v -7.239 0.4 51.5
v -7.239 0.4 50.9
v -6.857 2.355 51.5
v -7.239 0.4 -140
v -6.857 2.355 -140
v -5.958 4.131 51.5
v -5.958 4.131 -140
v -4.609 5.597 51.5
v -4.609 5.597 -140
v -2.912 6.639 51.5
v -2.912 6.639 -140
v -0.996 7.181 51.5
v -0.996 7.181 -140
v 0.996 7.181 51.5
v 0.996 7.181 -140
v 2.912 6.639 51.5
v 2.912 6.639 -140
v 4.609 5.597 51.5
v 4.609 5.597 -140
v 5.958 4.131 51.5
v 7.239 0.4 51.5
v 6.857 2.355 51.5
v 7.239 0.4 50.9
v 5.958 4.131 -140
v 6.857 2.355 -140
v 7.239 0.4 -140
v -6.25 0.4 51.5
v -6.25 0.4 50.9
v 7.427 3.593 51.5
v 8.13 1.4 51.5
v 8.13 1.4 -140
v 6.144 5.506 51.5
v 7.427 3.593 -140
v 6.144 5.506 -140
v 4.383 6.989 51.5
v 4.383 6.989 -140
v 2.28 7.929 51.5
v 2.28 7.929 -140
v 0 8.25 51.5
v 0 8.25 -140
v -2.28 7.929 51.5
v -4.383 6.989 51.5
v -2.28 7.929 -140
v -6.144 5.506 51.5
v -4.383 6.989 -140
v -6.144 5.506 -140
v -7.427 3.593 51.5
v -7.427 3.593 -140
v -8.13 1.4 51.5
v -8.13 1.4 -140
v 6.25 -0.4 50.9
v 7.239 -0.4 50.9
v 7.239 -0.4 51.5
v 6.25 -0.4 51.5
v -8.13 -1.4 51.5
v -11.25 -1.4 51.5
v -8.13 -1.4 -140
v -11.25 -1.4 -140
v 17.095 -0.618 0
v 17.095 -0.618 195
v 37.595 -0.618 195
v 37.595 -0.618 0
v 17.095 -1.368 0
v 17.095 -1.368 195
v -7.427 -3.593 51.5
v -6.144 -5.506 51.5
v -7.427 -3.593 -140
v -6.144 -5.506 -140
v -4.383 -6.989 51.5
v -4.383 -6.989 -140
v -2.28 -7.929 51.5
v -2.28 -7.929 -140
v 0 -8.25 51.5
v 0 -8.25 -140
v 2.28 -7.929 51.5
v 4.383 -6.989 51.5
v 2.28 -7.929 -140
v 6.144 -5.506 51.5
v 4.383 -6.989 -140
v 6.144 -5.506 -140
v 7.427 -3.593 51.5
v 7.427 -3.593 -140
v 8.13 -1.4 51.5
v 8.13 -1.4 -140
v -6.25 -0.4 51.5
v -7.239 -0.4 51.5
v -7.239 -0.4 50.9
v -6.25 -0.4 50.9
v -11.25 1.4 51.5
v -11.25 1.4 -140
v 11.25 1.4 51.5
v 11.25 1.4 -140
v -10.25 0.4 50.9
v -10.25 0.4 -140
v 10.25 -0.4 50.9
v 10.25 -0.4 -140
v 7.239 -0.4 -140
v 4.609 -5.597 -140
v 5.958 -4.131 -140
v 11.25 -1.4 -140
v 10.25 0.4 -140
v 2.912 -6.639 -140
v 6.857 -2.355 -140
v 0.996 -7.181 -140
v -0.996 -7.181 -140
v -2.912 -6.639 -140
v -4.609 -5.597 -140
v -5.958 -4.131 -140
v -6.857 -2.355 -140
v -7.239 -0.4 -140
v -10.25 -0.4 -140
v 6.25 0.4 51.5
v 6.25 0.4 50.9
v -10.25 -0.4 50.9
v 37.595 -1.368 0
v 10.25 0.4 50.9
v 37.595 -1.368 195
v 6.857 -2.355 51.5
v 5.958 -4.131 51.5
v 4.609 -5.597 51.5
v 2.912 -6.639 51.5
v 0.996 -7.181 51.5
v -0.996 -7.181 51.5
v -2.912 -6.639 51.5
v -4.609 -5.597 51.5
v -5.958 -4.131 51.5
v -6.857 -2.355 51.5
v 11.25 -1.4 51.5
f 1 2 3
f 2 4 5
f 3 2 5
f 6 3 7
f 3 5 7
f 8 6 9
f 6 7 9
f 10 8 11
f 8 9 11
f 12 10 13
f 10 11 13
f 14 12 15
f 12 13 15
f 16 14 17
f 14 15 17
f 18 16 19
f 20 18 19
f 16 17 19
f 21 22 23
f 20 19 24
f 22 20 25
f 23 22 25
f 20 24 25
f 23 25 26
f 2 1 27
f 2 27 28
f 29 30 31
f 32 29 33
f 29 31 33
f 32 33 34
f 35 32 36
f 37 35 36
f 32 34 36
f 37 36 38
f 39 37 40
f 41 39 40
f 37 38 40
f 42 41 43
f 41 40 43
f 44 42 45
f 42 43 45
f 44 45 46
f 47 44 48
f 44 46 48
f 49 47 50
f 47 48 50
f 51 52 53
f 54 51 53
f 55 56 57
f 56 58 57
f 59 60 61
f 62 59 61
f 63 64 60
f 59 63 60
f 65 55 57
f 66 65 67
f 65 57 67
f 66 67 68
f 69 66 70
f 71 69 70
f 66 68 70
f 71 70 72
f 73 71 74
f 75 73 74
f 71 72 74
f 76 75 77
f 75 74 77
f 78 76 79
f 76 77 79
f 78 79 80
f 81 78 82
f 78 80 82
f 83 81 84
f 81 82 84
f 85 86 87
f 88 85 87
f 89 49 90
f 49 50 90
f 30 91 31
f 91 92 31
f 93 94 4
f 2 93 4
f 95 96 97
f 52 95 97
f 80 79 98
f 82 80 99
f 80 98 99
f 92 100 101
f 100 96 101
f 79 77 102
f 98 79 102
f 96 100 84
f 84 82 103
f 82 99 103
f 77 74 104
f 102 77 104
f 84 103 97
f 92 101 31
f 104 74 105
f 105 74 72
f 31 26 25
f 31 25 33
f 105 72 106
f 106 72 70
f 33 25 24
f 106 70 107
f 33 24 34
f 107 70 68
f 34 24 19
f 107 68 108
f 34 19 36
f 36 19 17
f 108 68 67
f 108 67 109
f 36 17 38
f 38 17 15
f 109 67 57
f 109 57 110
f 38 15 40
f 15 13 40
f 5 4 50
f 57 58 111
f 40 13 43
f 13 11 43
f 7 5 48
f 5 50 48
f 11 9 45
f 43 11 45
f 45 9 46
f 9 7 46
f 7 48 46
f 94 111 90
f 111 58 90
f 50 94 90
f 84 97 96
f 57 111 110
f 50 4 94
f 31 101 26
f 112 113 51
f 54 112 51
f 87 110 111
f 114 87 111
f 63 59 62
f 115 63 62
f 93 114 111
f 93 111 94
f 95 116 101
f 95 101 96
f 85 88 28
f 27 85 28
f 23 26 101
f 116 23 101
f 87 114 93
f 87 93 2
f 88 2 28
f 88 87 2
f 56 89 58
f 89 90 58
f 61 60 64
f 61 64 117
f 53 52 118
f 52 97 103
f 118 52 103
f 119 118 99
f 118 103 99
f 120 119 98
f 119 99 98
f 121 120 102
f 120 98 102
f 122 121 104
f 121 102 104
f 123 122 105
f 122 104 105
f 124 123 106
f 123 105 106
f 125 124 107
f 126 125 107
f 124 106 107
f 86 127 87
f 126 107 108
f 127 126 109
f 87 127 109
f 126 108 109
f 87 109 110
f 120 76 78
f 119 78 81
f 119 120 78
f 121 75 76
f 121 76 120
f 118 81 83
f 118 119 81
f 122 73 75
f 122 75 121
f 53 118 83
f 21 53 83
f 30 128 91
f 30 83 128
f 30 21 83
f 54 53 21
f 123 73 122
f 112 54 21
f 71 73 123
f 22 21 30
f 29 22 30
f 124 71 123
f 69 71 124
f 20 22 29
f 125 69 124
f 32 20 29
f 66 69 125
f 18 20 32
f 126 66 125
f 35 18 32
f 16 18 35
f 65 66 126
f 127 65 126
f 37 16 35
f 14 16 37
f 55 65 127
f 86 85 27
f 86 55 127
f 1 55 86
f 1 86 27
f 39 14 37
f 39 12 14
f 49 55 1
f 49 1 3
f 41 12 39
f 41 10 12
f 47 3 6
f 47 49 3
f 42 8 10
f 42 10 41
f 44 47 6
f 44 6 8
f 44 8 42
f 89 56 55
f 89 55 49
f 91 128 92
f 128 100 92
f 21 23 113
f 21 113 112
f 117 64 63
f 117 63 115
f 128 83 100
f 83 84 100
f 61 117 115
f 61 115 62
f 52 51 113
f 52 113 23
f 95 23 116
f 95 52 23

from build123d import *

# Parameters (mm, degrees)
F1_DEPTH  = 50.5
F2_W      = 20.5
F2_H      = 0.75
F3_DEPTH  = 195
F4_DEPTH  = 140
F5_DEPTH  = 1
F6_DEPTH  = 4
F7_DEPTH  = 4
F9_DEPTH  = 190.9
F11_DEPTH = 190.9


with BuildPart() as f1:
    # F0 (on Top) → F1 (new body)
    with BuildSketch(Plane.XY):
        with BuildLine():
            Line((-10.25, 0.4), (-8.2402973247, 0.4))
            ThreePointArc((-8.2402973247, 0.4), (-8.2005778814, 0.9016775541), (-8.1303443961, 1.4))
            Line((-8.1303443961, 1.4), (-11.25, 1.4))
            Line((-11.25, 1.4), (-11.25, -1.4))
            Line((-11.25, -1.4), (-8.1303443961, -1.4))
            ThreePointArc((-8.1303443961, -1.4), (-8.2005778814, -0.9016775541), (-8.2402973247, -0.4))
            Line((-8.2402973247, -0.4), (-10.25, -0.4))
            Line((-10.25, -0.4), (-10.25, 0.4))
        make_face()
        with BuildLine():
            ThreePointArc((-7.2389571072, 0.4), (0, 7.25), (7.2389571072, 0.4))
            Line((7.2389571072, 0.4), (8.2402973247, 0.4))
            ThreePointArc((8.2402973247, 0.4), (8.2005778814, 0.9016775541), (8.1303443961, 1.4))
            ThreePointArc((8.1303443961, 1.4), (0, 8.25), (-8.1303443961, 1.4))
            ThreePointArc((-8.1303443961, 1.4), (-8.2005778814, 0.9016775541), (-8.2402973247, 0.4))
            Line((-8.2402973247, 0.4), (-7.2389571072, 0.4))
        make_face()
        with BuildLine():
            Line((8.2402973247, -0.4), (7.2389571072, -0.4))
            ThreePointArc((7.2389571072, -0.4), (0, -7.25), (-7.2389571072, -0.4))
            Line((-7.2389571072, -0.4), (-8.2402973247, -0.4))
            ThreePointArc((-8.2402973247, -0.4), (-8.2005778814, -0.9016775541), (-8.1303443961, -1.4))
            ThreePointArc((-8.1303443961, -1.4), (0, -8.25), (8.1303443961, -1.4))
            ThreePointArc((8.1303443961, -1.4), (8.2005778814, -0.9016775541), (8.2402973247, -0.4))
        make_face()
        with BuildLine():
            ThreePointArc((8.1303443961, 1.4), (8.2005778814, 0.9016775541), (8.2402973247, 0.4))
            Line((8.2402973247, 0.4), (10.25, 0.4))
            Line((10.25, 0.4), (10.25, -0.4))
            Line((10.25, -0.4), (8.2402973247, -0.4))
            ThreePointArc((8.2402973247, -0.4), (8.2005778814, -0.9016775541), (8.1303443961, -1.4))
            Line((8.1303443961, -1.4), (11.25, -1.4))
            Line((11.25, -1.4), (11.25, 1.4))
            Line((11.25, 1.4), (8.1303443961, 1.4))
        make_face()
    extrude(amount=F1_DEPTH)

    # F4 (add): a face of the model
    f4_faces = [f1.faces().sort_by_distance(p)[0] for p in [
        (-10.5290161286, 0, 0),
    ]]
    extrude(f4_faces, amount=F4_DEPTH)

    # F5 (add): a face of the model
    f5_faces = [f1.faces().sort_by_distance(p)[0] for p in [
        (-10.5290161286, 0, 50.5),
    ]]
    extrude(f5_faces, amount=F5_DEPTH)

    # F6 (add): a face of the model
    f6_faces = [f1.faces().sort_by_distance(p)[0] for p in [
        (10.25, 0, -44.25),
    ]]
    extrude(f6_faces, amount=F6_DEPTH)

    # F7 (add): a face of the model
    f7_faces = [f1.faces().sort_by_distance(p)[0] for p in [
        (-10.25, 0, -44.25),
    ]]
    extrude(f7_faces, amount=F7_DEPTH)

    # F8 (on face) → F9 (cut)
    with BuildSketch(Plane(origin=(0, 0, -140), x_dir=(1, 0, 0), z_dir=(0, 0, -1))):
        with BuildLine():
            ThreePointArc((7.2389571072, -0.4), (7.2755886424, 0), (7.2389571072, 0.4))
            Line((7.2389571072, 0.4), (6.25, 0.4))
            Line((6.25, 0.4), (6.25, -0.4))
            Line((6.25, -0.4), (7.2389571072, -0.4))
        make_face()
        with BuildLine():
            Line((-6.25, 0.4), (-7.2389571072, 0.4))
            ThreePointArc((-7.2389571072, 0.4), (-7.2755886424, 0), (-7.2389571072, -0.4))
            Line((-7.2389571072, -0.4), (-6.25, -0.4))
            Line((-6.25, -0.4), (-6.25, 0.4))
        make_face()
    extrude(amount=-F9_DEPTH, mode=Mode.SUBTRACT)

    # F10 (on face) → F11 (cut)
    with BuildSketch(Plane(origin=(0, 0, -140), x_dir=(1, 0, 0), z_dir=(0, 0, -1))):
        with BuildLine():
            ThreePointArc((-7.2389571072, -0.4), (-7.2755886424, 0), (-7.2389571072, 0.4))
            Line((-7.2389571072, 0.4), (-10.25, 0.4))
            Line((-10.25, 0.4), (-10.25, -0.4))
            Line((-10.25, -0.4), (-7.2389571072, -0.4))
        make_face()
        with BuildLine():
            Line((10.25, 0.4), (7.2389571072, 0.4))
            ThreePointArc((7.2389571072, 0.4), (7.2755886424, 0), (7.2389571072, -0.4))
            Line((7.2389571072, -0.4), (10.25, -0.4))
            Line((10.25, -0.4), (10.25, 0.4))
        make_face()
    extrude(amount=-F11_DEPTH, mode=Mode.SUBTRACT)


with BuildPart() as f3:
    # F2 (on Top) → F3 (new body)
    with BuildSketch(Plane.XY):
        with Locations((27.3445195556, -0.9925236842)):
            Rectangle(F2_W, F2_H)
    extrude(amount=F3_DEPTH)


solid = Compound([f1.part, f3.part])
